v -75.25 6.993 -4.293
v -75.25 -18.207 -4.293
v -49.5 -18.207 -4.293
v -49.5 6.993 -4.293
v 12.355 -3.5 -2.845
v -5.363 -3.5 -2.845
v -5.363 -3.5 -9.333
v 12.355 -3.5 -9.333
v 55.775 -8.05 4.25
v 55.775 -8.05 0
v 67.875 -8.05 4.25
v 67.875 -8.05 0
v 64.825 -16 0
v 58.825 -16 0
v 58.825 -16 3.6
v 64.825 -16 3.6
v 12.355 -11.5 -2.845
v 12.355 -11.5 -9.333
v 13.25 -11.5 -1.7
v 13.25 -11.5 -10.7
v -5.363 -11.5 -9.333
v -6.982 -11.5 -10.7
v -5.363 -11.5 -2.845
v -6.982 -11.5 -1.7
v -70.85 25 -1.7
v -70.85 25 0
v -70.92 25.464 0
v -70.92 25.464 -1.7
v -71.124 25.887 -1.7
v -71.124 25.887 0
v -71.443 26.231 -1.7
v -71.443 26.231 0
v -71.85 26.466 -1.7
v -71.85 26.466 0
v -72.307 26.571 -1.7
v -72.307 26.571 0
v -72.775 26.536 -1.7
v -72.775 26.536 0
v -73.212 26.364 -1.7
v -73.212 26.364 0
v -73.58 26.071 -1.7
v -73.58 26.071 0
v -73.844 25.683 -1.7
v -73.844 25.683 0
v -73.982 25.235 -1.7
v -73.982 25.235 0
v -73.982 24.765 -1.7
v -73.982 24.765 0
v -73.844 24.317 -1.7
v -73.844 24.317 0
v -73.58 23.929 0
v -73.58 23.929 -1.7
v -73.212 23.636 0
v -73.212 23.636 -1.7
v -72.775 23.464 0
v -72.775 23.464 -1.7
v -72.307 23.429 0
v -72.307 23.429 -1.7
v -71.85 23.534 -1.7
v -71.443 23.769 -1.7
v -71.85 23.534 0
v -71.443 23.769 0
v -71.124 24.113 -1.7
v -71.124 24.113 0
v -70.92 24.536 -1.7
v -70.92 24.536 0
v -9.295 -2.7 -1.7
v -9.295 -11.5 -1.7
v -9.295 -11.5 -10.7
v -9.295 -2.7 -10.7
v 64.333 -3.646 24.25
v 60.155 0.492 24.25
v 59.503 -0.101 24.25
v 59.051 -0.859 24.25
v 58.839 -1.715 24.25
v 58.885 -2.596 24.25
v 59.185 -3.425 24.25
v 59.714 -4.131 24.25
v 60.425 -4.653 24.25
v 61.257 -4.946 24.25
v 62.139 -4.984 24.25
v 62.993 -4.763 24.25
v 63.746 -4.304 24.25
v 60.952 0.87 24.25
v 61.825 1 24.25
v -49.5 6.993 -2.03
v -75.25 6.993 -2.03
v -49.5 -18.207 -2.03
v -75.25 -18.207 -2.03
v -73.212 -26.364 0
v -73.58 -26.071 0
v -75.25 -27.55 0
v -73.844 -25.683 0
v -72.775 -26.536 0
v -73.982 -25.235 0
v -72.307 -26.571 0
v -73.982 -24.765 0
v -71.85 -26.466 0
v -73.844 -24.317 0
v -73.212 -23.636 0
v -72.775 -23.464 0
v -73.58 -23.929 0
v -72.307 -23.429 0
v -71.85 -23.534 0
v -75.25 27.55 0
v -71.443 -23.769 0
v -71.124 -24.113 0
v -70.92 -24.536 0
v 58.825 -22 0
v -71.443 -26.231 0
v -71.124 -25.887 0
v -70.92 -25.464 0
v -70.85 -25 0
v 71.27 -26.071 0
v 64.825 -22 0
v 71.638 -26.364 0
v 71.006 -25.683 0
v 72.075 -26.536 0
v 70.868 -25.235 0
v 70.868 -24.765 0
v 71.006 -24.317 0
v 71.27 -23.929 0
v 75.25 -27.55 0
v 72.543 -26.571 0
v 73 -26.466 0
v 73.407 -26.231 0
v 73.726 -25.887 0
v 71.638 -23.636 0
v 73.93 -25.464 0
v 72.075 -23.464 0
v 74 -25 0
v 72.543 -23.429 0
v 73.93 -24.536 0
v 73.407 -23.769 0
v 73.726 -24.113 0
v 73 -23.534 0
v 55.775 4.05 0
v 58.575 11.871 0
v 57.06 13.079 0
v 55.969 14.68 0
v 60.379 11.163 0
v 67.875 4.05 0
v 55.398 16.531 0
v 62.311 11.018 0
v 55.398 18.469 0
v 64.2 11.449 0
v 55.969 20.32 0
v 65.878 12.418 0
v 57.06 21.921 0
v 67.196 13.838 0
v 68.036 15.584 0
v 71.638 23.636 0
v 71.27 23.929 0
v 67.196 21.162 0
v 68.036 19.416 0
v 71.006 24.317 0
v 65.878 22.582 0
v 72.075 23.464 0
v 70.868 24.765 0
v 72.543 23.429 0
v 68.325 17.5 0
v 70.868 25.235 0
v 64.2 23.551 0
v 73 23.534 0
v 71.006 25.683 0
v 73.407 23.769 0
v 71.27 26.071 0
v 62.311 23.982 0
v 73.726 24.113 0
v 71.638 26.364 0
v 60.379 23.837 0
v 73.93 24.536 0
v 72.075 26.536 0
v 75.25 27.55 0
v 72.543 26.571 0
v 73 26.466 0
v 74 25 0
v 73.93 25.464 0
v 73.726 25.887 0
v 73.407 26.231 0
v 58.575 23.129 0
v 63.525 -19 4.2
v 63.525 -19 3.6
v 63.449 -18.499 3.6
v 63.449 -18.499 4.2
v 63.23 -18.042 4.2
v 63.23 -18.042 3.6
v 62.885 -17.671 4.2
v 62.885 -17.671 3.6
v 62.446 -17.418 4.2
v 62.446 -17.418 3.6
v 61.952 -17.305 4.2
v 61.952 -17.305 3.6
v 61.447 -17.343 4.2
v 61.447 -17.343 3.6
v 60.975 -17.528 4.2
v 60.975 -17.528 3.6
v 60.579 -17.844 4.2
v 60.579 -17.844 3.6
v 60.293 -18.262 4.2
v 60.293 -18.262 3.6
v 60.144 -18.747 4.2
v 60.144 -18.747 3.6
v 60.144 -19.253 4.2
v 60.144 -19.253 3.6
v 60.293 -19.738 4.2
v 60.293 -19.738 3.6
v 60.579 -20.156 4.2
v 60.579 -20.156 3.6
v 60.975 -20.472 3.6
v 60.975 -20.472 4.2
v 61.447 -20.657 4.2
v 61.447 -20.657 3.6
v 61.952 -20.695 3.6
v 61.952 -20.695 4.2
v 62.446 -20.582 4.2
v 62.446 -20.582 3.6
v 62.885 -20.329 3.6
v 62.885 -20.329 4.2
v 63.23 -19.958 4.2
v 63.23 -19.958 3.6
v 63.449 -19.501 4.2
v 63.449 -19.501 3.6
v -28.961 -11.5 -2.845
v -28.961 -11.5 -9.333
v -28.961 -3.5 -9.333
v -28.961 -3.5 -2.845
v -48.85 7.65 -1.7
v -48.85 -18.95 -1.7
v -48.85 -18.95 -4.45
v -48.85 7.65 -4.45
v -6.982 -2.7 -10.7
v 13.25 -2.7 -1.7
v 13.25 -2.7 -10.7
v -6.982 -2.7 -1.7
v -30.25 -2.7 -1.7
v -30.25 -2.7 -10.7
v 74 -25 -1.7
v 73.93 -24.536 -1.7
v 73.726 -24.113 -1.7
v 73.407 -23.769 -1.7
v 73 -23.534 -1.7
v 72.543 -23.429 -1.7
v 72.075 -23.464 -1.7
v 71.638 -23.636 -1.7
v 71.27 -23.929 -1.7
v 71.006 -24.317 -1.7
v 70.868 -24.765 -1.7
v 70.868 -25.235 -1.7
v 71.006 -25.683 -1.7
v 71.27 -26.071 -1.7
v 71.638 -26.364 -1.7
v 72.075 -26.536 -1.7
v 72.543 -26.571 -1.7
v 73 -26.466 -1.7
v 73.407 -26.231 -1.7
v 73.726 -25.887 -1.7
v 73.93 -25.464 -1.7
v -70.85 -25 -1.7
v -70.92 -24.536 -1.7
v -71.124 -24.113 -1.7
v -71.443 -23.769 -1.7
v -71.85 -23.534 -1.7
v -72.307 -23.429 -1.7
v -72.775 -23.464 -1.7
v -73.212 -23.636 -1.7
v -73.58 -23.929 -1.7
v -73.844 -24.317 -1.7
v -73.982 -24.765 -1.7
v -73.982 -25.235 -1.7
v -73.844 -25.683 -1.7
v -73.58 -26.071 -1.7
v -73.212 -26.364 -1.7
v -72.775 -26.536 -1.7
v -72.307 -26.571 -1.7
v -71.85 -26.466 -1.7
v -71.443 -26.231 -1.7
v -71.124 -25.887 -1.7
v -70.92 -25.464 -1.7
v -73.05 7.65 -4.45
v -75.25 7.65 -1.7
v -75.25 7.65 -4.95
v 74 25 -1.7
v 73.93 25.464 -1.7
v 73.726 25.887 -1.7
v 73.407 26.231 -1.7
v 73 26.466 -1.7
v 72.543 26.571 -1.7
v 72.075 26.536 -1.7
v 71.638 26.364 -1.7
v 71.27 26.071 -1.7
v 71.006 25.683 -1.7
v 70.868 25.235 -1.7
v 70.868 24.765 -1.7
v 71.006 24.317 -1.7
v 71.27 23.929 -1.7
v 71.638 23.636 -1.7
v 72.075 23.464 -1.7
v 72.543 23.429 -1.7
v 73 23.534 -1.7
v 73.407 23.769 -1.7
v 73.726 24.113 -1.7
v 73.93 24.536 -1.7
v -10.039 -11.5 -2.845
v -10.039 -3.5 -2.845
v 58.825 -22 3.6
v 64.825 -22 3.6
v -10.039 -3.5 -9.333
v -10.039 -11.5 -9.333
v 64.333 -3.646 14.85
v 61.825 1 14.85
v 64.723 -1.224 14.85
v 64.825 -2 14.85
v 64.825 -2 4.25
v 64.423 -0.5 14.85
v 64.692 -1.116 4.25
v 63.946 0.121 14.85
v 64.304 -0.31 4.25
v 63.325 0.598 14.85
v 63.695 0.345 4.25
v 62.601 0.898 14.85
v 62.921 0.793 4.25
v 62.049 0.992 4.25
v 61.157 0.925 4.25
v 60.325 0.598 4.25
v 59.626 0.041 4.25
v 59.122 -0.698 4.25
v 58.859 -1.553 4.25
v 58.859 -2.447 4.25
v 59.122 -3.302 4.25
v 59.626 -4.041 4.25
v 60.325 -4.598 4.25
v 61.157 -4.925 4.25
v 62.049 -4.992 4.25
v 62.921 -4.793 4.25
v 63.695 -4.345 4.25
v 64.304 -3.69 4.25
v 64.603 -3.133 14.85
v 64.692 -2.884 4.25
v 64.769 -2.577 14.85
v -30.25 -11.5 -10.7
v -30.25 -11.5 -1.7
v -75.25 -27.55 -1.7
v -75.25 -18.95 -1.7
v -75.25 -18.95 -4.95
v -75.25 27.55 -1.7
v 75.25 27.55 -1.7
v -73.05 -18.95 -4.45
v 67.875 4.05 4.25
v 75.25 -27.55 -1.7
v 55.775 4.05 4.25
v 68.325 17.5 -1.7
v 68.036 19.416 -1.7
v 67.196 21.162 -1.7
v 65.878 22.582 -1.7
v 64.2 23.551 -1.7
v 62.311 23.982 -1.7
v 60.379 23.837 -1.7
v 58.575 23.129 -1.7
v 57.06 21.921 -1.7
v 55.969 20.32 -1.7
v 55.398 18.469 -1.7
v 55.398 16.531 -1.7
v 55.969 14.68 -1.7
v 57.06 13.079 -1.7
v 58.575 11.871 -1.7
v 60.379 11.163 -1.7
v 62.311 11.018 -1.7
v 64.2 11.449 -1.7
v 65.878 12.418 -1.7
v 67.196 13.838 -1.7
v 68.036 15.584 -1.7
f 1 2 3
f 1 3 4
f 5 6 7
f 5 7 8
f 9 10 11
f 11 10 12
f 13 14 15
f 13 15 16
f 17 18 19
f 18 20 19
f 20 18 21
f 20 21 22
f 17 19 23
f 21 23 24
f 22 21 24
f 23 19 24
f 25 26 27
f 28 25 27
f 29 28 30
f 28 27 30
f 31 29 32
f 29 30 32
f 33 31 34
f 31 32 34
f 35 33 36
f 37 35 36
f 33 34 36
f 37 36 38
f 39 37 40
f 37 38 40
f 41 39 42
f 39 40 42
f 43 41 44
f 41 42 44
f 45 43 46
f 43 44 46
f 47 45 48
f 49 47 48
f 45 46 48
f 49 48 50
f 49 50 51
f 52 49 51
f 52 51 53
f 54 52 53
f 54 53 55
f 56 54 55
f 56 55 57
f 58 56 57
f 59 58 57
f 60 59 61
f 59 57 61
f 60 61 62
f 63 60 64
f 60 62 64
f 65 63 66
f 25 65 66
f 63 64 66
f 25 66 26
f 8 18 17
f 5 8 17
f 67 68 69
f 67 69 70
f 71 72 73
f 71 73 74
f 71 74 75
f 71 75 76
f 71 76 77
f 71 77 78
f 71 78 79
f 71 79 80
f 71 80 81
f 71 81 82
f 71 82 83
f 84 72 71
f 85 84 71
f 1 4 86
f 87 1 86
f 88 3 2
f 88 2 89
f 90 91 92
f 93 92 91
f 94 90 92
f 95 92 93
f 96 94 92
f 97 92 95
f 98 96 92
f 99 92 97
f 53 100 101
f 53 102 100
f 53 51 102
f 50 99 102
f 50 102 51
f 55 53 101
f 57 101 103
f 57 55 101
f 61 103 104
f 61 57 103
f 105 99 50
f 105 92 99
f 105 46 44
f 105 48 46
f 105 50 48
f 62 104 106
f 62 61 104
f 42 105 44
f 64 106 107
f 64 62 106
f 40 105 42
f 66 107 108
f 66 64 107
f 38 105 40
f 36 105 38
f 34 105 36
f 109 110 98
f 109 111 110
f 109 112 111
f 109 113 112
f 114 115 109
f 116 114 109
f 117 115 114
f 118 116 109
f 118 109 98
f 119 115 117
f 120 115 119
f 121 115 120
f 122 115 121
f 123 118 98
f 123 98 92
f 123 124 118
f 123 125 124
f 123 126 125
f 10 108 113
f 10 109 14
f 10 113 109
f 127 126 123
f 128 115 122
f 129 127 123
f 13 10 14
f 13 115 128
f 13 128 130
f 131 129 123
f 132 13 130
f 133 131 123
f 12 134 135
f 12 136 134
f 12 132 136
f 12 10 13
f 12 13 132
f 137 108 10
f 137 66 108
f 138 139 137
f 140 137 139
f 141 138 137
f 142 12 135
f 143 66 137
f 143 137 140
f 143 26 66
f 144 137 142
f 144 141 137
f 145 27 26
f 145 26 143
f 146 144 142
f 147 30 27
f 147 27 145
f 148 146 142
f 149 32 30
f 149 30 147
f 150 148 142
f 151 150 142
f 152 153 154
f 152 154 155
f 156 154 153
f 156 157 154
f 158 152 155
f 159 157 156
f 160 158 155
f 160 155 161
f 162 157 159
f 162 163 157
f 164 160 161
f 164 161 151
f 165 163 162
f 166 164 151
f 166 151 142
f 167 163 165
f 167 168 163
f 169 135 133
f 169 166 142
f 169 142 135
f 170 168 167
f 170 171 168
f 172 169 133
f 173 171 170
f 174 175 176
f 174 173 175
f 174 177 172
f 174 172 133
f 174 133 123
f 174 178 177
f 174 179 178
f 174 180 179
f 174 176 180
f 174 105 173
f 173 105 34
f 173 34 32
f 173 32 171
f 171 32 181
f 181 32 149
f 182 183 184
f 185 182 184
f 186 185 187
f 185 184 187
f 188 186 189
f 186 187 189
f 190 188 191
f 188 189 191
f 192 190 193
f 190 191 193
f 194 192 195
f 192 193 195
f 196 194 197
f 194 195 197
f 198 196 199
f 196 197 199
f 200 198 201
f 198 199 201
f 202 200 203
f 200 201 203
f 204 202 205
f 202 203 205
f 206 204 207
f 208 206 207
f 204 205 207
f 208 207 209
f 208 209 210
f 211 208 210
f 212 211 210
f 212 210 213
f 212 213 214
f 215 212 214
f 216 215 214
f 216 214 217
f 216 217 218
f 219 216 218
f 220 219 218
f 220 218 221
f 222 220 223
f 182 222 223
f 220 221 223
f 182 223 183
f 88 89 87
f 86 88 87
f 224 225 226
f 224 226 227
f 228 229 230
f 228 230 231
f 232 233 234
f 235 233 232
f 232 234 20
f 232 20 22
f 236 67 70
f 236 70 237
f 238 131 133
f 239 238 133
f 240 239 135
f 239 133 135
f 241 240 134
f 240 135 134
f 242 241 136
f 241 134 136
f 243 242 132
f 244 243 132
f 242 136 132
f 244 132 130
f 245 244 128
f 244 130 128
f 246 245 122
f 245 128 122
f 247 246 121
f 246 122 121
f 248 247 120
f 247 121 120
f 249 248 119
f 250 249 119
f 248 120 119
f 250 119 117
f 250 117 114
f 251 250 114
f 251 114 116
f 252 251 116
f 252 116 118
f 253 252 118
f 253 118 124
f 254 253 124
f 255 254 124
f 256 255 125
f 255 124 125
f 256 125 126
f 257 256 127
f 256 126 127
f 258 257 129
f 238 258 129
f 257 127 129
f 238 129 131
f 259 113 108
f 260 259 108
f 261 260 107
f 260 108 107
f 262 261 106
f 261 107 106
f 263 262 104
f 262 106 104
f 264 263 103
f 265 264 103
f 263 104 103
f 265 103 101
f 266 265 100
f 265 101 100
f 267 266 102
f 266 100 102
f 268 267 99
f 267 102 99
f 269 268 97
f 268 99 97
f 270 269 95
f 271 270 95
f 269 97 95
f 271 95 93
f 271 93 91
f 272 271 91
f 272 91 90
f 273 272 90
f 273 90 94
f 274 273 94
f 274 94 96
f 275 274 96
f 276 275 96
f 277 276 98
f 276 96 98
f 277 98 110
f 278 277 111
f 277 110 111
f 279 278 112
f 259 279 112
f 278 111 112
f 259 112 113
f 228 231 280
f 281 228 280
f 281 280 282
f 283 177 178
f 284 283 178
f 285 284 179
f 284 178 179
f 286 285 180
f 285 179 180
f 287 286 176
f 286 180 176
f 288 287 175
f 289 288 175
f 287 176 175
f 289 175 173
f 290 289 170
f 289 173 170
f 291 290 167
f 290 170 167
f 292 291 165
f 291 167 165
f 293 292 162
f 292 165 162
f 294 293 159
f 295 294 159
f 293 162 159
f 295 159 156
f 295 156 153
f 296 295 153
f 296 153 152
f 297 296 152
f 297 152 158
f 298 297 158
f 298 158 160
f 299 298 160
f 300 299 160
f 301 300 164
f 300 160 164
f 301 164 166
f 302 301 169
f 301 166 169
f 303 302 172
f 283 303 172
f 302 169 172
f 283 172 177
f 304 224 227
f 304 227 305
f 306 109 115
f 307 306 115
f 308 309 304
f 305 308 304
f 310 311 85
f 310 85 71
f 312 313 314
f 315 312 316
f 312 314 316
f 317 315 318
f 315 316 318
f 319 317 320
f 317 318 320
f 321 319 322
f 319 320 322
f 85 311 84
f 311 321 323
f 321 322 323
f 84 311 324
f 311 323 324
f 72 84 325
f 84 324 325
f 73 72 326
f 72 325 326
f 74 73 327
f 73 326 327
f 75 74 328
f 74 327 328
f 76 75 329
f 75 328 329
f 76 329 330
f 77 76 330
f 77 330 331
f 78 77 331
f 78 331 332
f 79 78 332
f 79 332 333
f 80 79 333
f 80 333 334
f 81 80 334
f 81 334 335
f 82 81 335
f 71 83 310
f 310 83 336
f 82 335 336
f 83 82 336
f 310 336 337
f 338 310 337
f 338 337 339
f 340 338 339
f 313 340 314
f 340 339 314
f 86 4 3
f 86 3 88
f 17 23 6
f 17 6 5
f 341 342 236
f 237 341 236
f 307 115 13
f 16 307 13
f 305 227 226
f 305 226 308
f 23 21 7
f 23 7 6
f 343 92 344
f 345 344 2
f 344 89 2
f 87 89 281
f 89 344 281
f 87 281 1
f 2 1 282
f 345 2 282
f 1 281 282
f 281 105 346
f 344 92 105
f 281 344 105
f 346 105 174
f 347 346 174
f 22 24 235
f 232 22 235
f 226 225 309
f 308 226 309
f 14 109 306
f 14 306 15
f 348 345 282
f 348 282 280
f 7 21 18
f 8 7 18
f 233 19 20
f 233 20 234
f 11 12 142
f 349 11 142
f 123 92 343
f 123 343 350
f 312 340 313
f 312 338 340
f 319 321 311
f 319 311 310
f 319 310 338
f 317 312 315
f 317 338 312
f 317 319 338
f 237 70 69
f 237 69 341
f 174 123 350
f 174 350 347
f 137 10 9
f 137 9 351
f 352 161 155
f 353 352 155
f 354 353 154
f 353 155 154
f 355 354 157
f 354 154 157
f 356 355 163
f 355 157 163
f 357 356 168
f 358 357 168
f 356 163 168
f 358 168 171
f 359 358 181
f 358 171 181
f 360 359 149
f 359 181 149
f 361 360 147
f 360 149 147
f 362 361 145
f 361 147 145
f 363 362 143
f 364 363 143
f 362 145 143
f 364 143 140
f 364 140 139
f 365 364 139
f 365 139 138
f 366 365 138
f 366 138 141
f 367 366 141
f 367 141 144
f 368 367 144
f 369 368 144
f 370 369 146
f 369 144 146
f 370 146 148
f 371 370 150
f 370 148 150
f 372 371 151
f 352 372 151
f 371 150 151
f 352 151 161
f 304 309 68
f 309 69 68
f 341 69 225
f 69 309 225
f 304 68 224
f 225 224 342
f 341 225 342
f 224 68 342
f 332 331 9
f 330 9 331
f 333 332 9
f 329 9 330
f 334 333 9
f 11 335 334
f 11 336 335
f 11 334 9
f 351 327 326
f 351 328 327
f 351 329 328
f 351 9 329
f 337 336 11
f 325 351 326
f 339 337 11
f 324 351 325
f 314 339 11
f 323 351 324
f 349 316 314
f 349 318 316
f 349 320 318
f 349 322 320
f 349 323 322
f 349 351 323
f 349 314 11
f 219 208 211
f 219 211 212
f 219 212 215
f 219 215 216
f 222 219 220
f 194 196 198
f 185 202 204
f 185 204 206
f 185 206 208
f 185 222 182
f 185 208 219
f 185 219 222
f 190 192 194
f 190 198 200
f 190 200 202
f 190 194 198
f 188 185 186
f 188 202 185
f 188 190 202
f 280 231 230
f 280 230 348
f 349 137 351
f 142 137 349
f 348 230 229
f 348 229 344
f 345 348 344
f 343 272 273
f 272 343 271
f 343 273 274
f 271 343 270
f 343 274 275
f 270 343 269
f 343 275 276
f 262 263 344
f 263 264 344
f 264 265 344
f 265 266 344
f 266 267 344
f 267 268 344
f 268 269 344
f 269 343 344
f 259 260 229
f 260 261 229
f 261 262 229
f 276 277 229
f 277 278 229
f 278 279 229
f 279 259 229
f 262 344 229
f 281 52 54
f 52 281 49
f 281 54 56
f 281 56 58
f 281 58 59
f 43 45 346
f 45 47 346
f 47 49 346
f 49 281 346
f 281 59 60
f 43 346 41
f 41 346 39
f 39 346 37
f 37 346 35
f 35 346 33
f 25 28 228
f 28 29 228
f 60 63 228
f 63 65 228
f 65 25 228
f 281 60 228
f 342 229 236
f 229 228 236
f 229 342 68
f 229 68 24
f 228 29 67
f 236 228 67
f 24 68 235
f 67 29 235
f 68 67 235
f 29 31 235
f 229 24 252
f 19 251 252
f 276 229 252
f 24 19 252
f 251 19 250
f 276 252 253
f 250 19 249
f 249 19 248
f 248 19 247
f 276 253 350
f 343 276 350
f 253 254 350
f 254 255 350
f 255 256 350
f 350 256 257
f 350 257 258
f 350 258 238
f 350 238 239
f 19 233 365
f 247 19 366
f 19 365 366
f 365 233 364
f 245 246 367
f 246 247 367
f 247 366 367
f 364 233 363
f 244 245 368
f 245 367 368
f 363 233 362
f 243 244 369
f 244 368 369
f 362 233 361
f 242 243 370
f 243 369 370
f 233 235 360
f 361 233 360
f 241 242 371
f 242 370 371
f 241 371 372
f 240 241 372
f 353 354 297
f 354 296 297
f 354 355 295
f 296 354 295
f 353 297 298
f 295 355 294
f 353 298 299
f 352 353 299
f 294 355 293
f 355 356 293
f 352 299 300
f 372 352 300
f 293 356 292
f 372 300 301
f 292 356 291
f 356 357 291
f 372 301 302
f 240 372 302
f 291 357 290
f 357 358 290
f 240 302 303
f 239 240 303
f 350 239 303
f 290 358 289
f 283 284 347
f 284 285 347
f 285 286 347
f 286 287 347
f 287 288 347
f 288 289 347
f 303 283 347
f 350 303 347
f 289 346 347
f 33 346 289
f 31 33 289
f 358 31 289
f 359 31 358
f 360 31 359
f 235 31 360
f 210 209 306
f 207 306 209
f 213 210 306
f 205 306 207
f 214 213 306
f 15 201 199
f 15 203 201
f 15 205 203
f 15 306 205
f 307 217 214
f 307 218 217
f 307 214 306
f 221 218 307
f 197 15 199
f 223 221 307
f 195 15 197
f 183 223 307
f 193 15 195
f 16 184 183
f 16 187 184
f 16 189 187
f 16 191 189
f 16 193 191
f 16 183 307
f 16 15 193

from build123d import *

# Parameters (mm, degrees)
SKETCH1_W                = 150.5
SKETCH1_H                = 55.1
SKETCH1_R                = 1.575
SKETCH1_R_2              = 6.5
SKETCH1_W_2              = 12.1
SKETCH1_H_2              = 12.1
SKETCH1_W_3              = 6
SKETCH1_H_3              = 6
BOSS_EXTRUDE1_DEPTH      = 1.7
SKETCH3_W                = 12.1
SKETCH3_H                = 12.1
BOSS_EXTRUDE2_DEPTH      = 4.25
BOSS_EXTRUDE2_DEPTH_BACK = 1.7
SKETCH5_R                = 3
BOSS_EXTRUDE3_DEPTH      = 20
CUT_EXTRUDE1_DEPTH       = 9.4
SKETCH7_W                = 6
SKETCH7_H                = 6
BOSS_EXTRUDE4_DEPTH      = 3.6
BOSS_EXTRUDE4_DEPTH_BACK = 1.7
SKETCH8_R                = 1.7
BOSS_EXTRUDE5_DEPTH      = 0.6
SKETCH9_W                = 26.4
SKETCH9_H                = 26.6
BOSS_EXTRUDE6_DEPTH      = 2.75
BOSS_EXTRUDE7_DEPTH      = 26.6
SKETCH11_W               = 2.263245578
SKETCH11_H               = 25.200228651
CUT_EXTRUDE2_DEPTH       = 25.75
SKETCH12_W               = 20.23176928
SKETCH12_H               = 8.8
SKETCH12_W_2             = 20.955499341
BOSS_EXTRUDE8_DEPTH      = 9
SKETCH13_W               = 17.717825076
SKETCH13_H               = 6.488260173
SKETCH13_W_2             = 18.921956069
CUT_EXTRUDE3_DEPTH       = 8


with BuildPart() as part:
    # Sketch1 → Boss-Extrude1 (new body)
    with BuildSketch(Plane.XY):
        Rectangle(SKETCH1_W, SKETCH1_H)
        with Locations((-72.425, 25)):
            Circle(SKETCH1_R, mode=Mode.SUBTRACT)
        with Locations((72.425, 25)):
            Circle(SKETCH1_R, mode=Mode.SUBTRACT)
        with Locations((72.425, -25)):
            Circle(SKETCH1_R, mode=Mode.SUBTRACT)
        with Locations((-72.425, -25)):
            Circle(SKETCH1_R, mode=Mode.SUBTRACT)
        with Locations((61.825, 17.5)):
            Circle(SKETCH1_R_2, mode=Mode.SUBTRACT)
        with Locations((61.825, -2)):
            Rectangle(SKETCH1_W_2, SKETCH1_H_2, mode=Mode.SUBTRACT)
        with Locations((61.825, -19)):
            Rectangle(SKETCH1_W_3, SKETCH1_H_3, mode=Mode.SUBTRACT)
    extrude(amount=-BOSS_EXTRUDE1_DEPTH)

    # Sketch3 → Boss-Extrude2 (add, two sides)
    with BuildSketch(Plane.XY) as boss_extrude2_sk:
        with Locations((61.825, -2)):
            Rectangle(SKETCH3_W, SKETCH3_H)
    extrude(amount=BOSS_EXTRUDE2_DEPTH)
    extrude(boss_extrude2_sk.sketch, amount=-BOSS_EXTRUDE2_DEPTH_BACK)

    # Sketch5 → Boss-Extrude3 (add)
    with BuildSketch(Plane.XY.offset(4.25)):
        with Locations((61.825, -2)):
            Circle(SKETCH5_R)
    extrude(amount=BOSS_EXTRUDE3_DEPTH)

    # Sketch6 → Cut-Extrude1 (cut)
    with BuildSketch(Plane.XY.offset(24.25)):
        Polygon((61.825, 1), (64.333206892, -3.645873077), (66.484499698, -3.318483035), (63.123279269, 3.423164798), align=None)
    extrude(amount=-CUT_EXTRUDE1_DEPTH, mode=Mode.SUBTRACT)

    # Sketch7 → Boss-Extrude4 (add, two sides)
    with BuildSketch(Plane.XY) as boss_extrude4_sk:
        with Locations((61.825, -19)):
            Rectangle(SKETCH7_W, SKETCH7_H)
    extrude(amount=BOSS_EXTRUDE4_DEPTH)
    extrude(boss_extrude4_sk.sketch, amount=-BOSS_EXTRUDE4_DEPTH_BACK)

    # Sketch8 → Boss-Extrude5 (add)
    with BuildSketch(Plane.XY.offset(3.6)):
        with Locations((61.825, -19)):
            Circle(SKETCH8_R)
    extrude(amount=BOSS_EXTRUDE5_DEPTH)

    # Sketch9 → Boss-Extrude6 (add)
    with BuildSketch(Plane(origin=(0, 0, -1.7), x_dir=(-1, 0, 0), z_dir=(0, 0, -1))):
        with Locations((62.05, -5.65)):
            Rectangle(SKETCH9_W, SKETCH9_H)
    extrude(amount=BOSS_EXTRUDE6_DEPTH)

    # Sketch10 → Boss-Extrude7 (add)
    with BuildSketch(Plane(origin=(0, 7.65, 0), x_dir=(1, 0, 0), z_dir=(0, 1, 0))):
        Polygon((-75.25, 4.45), (-75.25, 4.95), (-73.05, 4.45), align=None)
    extrude(amount=-BOSS_EXTRUDE7_DEPTH)

    # Sketch11 → Cut-Extrude2 (cut)
    with BuildSketch(Plane.ZY.offset(75.25)):
        with Locations((-3.161622789, -5.606749437)):
            Rectangle(SKETCH11_W, SKETCH11_H)
    extrude(amount=-CUT_EXTRUDE2_DEPTH, mode=Mode.SUBTRACT)

    # Sketch12 → Boss-Extrude8 (add)
    with BuildSketch(Plane(origin=(0, 0, -1.7), x_dir=(-1, 0, 0), z_dir=(0, 0, -1))):
        with Locations((-3.13411536, -7.1)):
            Rectangle(SKETCH12_W, SKETCH12_H)
        with Locations((19.77225033, -7.1)):
            Rectangle(SKETCH12_W_2, SKETCH12_H)
    extrude(amount=BOSS_EXTRUDE8_DEPTH)

    # Sketch13 → Cut-Extrude3 (cut)
    with BuildSketch(Plane.XZ.offset(11.5)):
        with Locations((3.496108, -6.088951298)):
            Rectangle(SKETCH13_W, SKETCH13_H)
        with Locations((-19.500417756, -6.088951298)):
            Rectangle(SKETCH13_W_2, SKETCH13_H)
    extrude(amount=-CUT_EXTRUDE3_DEPTH, mode=Mode.SUBTRACT)


solid = part.part
